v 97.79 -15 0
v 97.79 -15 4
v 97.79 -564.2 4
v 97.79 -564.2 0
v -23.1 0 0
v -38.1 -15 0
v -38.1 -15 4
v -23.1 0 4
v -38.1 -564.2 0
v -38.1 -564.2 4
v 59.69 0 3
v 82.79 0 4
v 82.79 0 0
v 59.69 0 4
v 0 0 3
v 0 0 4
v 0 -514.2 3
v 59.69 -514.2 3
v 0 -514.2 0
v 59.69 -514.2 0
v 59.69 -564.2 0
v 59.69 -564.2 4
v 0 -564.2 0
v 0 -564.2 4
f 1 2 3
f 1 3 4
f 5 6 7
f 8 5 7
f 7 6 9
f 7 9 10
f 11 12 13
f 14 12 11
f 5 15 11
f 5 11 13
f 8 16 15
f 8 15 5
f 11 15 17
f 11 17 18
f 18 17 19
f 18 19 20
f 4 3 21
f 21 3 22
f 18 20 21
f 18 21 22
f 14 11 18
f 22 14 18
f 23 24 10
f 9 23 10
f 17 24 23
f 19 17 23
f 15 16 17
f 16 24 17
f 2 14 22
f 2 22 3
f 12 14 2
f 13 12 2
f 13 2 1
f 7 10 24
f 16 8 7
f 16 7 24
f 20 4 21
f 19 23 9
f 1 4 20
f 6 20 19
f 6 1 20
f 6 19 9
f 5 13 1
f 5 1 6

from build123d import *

# Parameters (mm, degrees)
F0_W     = 59.69
F0_H     = 3
F1_DEPTH = 514.2
F3_DEPTH = 564.2
F4_SIZE  = 15


with BuildPart() as f1:
    # F0 (on Front) → F1 (new body)
    with BuildSketch(Plane.XZ):
        with Locations((29.845, 1.5)):
            Rectangle(F0_W, F0_H)
    extrude(amount=F1_DEPTH)

    # F2 (on face) → F3 (join)
    with BuildSketch(Plane(origin=(0, 0, 0), x_dir=(-1, 0, 0), z_dir=(0, 1, 0))):
        Polygon((-97.79, 0), (-59.69, 0), (-59.69, 3), (-59.69, 4), (-97.79, 4), (-97.79, 1.197734), align=None)
        Polygon((0, 4), (0, 3), (0, 0), (38.1, 0), (38.1, 4), align=None)
    extrude(amount=-F3_DEPTH)

    # F4
    f4_edges = [f1.edges().sort_by_distance(p)[0] for p in [
        (97.79, 0, 2),
        (-38.1, 0, 2),
    ]]
    chamfer(f4_edges, length=F4_SIZE)


solid = f1.part
